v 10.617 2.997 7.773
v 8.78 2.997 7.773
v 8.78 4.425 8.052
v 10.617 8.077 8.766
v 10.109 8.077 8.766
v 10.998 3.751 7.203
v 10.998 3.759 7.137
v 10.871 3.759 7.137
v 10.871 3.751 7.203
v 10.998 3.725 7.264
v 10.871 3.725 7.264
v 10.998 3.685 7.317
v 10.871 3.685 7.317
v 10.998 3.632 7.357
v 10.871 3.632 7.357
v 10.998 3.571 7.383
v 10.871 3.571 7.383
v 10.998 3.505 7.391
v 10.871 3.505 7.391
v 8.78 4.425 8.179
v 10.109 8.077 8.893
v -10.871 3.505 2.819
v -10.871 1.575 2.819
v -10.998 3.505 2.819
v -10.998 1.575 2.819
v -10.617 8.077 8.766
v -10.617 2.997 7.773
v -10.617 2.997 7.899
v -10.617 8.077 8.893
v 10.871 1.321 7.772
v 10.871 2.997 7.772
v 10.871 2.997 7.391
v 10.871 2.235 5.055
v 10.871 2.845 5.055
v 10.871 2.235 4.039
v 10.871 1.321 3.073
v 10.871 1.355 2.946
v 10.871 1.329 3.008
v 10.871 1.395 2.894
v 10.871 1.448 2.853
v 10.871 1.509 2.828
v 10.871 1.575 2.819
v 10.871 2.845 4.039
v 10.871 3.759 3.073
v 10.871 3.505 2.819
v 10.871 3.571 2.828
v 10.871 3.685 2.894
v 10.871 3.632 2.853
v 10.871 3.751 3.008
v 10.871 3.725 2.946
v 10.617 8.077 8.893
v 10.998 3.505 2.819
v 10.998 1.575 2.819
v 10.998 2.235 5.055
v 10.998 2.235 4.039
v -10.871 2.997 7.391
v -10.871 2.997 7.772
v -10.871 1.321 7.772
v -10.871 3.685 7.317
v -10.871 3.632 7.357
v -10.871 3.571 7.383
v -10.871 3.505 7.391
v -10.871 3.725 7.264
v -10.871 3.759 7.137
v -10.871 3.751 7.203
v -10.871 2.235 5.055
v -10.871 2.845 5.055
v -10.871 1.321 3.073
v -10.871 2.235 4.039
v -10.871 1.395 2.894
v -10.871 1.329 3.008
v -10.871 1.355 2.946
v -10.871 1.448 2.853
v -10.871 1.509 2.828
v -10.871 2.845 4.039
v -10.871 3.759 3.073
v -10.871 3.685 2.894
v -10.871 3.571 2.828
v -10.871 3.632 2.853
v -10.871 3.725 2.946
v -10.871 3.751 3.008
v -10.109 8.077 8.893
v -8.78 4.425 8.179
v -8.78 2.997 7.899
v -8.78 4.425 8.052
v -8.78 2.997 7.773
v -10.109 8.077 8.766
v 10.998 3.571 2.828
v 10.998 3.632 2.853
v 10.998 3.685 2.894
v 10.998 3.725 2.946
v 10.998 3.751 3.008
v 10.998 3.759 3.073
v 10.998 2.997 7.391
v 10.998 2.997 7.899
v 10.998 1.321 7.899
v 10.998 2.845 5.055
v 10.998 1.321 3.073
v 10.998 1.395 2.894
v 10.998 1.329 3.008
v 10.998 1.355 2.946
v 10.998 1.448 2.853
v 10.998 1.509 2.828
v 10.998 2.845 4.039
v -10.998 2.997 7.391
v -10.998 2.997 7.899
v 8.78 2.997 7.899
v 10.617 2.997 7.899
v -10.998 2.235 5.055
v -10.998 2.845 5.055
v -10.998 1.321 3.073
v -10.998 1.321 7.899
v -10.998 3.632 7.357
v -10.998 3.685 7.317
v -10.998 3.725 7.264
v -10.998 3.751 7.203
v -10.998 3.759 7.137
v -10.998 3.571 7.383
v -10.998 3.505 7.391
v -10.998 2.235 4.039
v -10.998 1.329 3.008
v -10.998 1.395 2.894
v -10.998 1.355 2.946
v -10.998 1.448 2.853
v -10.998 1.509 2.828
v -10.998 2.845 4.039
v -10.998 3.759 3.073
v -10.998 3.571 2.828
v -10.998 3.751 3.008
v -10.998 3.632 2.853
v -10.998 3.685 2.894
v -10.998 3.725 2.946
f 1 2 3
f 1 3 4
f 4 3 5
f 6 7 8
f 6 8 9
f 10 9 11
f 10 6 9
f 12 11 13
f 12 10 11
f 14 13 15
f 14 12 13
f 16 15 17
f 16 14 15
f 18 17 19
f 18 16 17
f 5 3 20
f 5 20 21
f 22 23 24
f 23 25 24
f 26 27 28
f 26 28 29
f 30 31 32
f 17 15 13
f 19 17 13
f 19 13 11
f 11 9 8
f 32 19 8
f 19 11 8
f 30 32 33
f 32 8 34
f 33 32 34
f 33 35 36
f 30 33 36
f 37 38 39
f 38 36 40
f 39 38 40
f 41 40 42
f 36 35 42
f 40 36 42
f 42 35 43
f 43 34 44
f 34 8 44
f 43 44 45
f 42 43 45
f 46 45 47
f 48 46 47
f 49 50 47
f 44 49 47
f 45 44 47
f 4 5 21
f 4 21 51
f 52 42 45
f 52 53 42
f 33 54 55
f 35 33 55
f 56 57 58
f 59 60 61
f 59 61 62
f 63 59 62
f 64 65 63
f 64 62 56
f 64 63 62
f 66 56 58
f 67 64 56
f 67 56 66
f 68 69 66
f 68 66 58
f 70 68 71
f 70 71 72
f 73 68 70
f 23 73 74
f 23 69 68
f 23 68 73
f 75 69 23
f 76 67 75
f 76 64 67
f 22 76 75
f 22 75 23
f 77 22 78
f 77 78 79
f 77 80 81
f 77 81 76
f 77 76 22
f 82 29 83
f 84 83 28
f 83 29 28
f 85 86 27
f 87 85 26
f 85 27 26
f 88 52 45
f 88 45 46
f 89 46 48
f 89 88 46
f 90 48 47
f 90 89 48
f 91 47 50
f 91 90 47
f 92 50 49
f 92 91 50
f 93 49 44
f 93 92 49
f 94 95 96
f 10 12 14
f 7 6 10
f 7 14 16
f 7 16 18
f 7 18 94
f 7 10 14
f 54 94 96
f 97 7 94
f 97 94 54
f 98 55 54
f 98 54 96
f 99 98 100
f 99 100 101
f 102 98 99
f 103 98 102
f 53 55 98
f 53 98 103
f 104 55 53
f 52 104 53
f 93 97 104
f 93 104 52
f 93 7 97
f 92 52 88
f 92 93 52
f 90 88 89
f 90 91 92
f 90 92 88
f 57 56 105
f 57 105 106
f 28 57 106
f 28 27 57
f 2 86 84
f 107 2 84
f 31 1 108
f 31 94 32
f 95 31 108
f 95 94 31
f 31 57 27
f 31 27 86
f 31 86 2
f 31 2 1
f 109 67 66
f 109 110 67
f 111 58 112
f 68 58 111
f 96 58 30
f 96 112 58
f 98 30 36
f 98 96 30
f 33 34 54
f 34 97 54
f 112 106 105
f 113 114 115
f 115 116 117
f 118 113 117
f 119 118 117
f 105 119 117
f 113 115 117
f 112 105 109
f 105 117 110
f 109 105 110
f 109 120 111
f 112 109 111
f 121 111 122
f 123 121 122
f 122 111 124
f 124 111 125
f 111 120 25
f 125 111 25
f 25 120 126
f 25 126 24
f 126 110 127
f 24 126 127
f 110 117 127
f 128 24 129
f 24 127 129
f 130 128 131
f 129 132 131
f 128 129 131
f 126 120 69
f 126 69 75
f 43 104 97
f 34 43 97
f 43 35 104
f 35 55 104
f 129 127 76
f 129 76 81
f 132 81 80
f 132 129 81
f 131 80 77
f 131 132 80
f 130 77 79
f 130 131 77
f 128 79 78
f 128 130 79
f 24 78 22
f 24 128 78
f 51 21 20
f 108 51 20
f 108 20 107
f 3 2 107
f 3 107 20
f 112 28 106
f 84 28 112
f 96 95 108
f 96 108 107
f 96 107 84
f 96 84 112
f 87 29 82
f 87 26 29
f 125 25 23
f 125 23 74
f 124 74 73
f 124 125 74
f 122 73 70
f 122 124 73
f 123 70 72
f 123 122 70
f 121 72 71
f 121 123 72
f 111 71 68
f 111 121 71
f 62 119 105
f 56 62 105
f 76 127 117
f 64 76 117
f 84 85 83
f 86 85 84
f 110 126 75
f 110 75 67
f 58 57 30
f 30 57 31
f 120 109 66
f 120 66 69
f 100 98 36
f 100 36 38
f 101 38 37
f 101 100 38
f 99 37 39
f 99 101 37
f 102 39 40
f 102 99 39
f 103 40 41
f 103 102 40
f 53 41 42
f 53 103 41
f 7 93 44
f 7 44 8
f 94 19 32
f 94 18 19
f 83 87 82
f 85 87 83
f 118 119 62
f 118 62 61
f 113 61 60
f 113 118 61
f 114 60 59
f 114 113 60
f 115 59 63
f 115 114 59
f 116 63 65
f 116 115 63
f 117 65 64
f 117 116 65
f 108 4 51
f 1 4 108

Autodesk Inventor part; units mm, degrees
sketch "Sketch_7" plane through (0, 0, 7.8994) normal (0, 0, 1) x (1, 0, 0)
  line L0 (-10.8712, 1.3208) -> (10.8712, 1.3208)
  line L1 (10.8712, 1.3208) -> (10.8712, 2.9972)
  line L2 (10.8712, 2.9972) -> (-10.8712, 2.9972)
  line L3 (-10.8712, 2.9972) -> (-10.8712, 1.3208)
extrude "Extrusion1" add sketch "Sketch_7" against normal blind 0.127
sketch "Sketch_11" plane through (-10.9982, 0, 0) normal (1, 0, 0) x (0, 0, -1)
  line L0 (-7.8994, 1.3208) -> (-3.0734, 1.3208)
  arc A0 (-3.0734, 1.3208) -> (-2.8194, 1.5748) centre (-3.0734, 1.5748) ccw
  line L1 (-2.8194, 1.5748) -> (-2.8194, 3.5052)
  arc A1 (-2.8194, 3.5052) -> (-3.0734, 3.7592) centre (-3.0734, 3.5052) ccw
  line L2 (-3.0734, 3.7592) -> (-7.1374, 3.7592)
  arc A2 (-7.1374, 3.7592) -> (-7.3914, 3.5052) centre (-7.1374, 3.5052) ccw
  line L3 (-7.3914, 3.5052) -> (-7.3914, 2.9972)
  line L4 (-7.3914, 2.9972) -> (-7.8994, 2.9972)
  line L5 (-7.8994, 2.9972) -> (-7.8994, 1.3208)
  line L6 (-5.0546, 2.8448) -> (-5.0546, 2.2352)
  line L7 (-5.0546, 2.2352) -> (-4.0386, 2.2352)
  line L8 (-4.0386, 2.2352) -> (-4.0386, 2.8448)
  line L9 (-4.0386, 2.8448) -> (-5.0546, 2.8448)
extrude "Extrusion2" add sketch "Sketch_11" along normal blind 0.127
sketch "Sketch_13" plane through (10.9982, 0, 0) normal (1, 0, 0) x (0, 0, -1)
  line L0 (-7.8994, 1.3208) -> (-3.0734, 1.3208)
  arc A0 (-3.0734, 1.3208) -> (-2.8194, 1.5748) centre (-3.0734, 1.5748) ccw
  line L1 (-2.8194, 1.5748) -> (-2.8194, 3.5052)
  arc A1 (-2.8194, 3.5052) -> (-3.0734, 3.7592) centre (-3.0734, 3.5052) ccw
  line L2 (-3.0734, 3.7592) -> (-7.1374, 3.7592)
  arc A2 (-7.1374, 3.7592) -> (-7.3914, 3.5052) centre (-7.1374, 3.5052) ccw
  line L3 (-7.3914, 3.5052) -> (-7.3914, 2.9972)
  line L4 (-7.3914, 2.9972) -> (-7.8994, 2.9972)
  line L5 (-7.8994, 2.9972) -> (-7.8994, 1.3208)
  line L6 (-5.0546, 2.8448) -> (-5.0546, 2.2352)
  line L7 (-5.0546, 2.2352) -> (-4.0386, 2.2352)
  line L8 (-4.0386, 2.2352) -> (-4.0386, 2.8448)
  line L9 (-4.0386, 2.8448) -> (-5.0546, 2.8448)
extrude "Extrusion3" add sketch "Sketch_13" against normal blind 0.127
sketch "Sketch_17" plane through (0, 0, 0) normal (1, 0, 0) x (0, 1, 0)
  line L0 (8.128, 8.9027) -> (2.9972, 7.8994)
  line L1 (2.9972, 7.8994) -> (2.9972, 7.7726)
  line L2 (2.9972, 7.7726) -> (8.1519, 8.7806)
  line L3 (8.1519, 8.7806) -> (8.128, 8.9027)
extrude "Extrusion4" add sketch "Sketch_17" along normal mid plane 21.336
sketch "Sketch_18" plane through (0, 0, 7.6454) normal (0, 0, 1) x (1, 0, 0)
  line L0 (-11.1252, 8.4328) -> (-11.1252, 2.9972)
  line L1 (-11.1252, 2.9972) -> (-10.6172, 2.9972)
  line L2 (-10.6172, 2.9972) -> (-10.6172, 8.0772)
  line L3 (-10.6172, 8.0772) -> (-10.1092, 8.0772)
  line L4 (-10.1092, 8.0772) -> (-8.78, 4.4254)
  line L5 (-8.78, 4.4254) -> (-8.78, 2.9972)
  line L6 (-8.78, 2.9972) -> (8.78, 2.9972)
  line L7 (8.78, 2.9972) -> (8.78, 4.4254)
  line L8 (8.78, 4.4254) -> (10.1092, 8.0772)
  line L9 (10.1092, 8.0772) -> (10.6172, 8.0772)
  line L10 (10.6172, 8.0772) -> (10.6172, 2.9972)
  line L11 (10.6172, 2.9972) -> (11.1252, 2.9972)
  line L12 (11.1252, 2.9972) -> (11.1252, 8.4328)
  line L13 (11.1252, 8.4328) -> (-11.1252, 8.4328)
extrude "Extrusion5" cut sketch "Sketch_18" along normal blind 2.794
ref_plane "metal_XY" through (0, 0, 0) normal (0, 1, 0) x (1, 0, 0)
ref_plane "metal_YZ" through (0, 0, 0) normal (1, 0, 0) x (0, 0, -1)
ref_plane "metal_ZX" through (0, 0, 0) normal (0, 0, -1) x (0, 1, 0)
properties part number "UB16NKG015F-NR"
